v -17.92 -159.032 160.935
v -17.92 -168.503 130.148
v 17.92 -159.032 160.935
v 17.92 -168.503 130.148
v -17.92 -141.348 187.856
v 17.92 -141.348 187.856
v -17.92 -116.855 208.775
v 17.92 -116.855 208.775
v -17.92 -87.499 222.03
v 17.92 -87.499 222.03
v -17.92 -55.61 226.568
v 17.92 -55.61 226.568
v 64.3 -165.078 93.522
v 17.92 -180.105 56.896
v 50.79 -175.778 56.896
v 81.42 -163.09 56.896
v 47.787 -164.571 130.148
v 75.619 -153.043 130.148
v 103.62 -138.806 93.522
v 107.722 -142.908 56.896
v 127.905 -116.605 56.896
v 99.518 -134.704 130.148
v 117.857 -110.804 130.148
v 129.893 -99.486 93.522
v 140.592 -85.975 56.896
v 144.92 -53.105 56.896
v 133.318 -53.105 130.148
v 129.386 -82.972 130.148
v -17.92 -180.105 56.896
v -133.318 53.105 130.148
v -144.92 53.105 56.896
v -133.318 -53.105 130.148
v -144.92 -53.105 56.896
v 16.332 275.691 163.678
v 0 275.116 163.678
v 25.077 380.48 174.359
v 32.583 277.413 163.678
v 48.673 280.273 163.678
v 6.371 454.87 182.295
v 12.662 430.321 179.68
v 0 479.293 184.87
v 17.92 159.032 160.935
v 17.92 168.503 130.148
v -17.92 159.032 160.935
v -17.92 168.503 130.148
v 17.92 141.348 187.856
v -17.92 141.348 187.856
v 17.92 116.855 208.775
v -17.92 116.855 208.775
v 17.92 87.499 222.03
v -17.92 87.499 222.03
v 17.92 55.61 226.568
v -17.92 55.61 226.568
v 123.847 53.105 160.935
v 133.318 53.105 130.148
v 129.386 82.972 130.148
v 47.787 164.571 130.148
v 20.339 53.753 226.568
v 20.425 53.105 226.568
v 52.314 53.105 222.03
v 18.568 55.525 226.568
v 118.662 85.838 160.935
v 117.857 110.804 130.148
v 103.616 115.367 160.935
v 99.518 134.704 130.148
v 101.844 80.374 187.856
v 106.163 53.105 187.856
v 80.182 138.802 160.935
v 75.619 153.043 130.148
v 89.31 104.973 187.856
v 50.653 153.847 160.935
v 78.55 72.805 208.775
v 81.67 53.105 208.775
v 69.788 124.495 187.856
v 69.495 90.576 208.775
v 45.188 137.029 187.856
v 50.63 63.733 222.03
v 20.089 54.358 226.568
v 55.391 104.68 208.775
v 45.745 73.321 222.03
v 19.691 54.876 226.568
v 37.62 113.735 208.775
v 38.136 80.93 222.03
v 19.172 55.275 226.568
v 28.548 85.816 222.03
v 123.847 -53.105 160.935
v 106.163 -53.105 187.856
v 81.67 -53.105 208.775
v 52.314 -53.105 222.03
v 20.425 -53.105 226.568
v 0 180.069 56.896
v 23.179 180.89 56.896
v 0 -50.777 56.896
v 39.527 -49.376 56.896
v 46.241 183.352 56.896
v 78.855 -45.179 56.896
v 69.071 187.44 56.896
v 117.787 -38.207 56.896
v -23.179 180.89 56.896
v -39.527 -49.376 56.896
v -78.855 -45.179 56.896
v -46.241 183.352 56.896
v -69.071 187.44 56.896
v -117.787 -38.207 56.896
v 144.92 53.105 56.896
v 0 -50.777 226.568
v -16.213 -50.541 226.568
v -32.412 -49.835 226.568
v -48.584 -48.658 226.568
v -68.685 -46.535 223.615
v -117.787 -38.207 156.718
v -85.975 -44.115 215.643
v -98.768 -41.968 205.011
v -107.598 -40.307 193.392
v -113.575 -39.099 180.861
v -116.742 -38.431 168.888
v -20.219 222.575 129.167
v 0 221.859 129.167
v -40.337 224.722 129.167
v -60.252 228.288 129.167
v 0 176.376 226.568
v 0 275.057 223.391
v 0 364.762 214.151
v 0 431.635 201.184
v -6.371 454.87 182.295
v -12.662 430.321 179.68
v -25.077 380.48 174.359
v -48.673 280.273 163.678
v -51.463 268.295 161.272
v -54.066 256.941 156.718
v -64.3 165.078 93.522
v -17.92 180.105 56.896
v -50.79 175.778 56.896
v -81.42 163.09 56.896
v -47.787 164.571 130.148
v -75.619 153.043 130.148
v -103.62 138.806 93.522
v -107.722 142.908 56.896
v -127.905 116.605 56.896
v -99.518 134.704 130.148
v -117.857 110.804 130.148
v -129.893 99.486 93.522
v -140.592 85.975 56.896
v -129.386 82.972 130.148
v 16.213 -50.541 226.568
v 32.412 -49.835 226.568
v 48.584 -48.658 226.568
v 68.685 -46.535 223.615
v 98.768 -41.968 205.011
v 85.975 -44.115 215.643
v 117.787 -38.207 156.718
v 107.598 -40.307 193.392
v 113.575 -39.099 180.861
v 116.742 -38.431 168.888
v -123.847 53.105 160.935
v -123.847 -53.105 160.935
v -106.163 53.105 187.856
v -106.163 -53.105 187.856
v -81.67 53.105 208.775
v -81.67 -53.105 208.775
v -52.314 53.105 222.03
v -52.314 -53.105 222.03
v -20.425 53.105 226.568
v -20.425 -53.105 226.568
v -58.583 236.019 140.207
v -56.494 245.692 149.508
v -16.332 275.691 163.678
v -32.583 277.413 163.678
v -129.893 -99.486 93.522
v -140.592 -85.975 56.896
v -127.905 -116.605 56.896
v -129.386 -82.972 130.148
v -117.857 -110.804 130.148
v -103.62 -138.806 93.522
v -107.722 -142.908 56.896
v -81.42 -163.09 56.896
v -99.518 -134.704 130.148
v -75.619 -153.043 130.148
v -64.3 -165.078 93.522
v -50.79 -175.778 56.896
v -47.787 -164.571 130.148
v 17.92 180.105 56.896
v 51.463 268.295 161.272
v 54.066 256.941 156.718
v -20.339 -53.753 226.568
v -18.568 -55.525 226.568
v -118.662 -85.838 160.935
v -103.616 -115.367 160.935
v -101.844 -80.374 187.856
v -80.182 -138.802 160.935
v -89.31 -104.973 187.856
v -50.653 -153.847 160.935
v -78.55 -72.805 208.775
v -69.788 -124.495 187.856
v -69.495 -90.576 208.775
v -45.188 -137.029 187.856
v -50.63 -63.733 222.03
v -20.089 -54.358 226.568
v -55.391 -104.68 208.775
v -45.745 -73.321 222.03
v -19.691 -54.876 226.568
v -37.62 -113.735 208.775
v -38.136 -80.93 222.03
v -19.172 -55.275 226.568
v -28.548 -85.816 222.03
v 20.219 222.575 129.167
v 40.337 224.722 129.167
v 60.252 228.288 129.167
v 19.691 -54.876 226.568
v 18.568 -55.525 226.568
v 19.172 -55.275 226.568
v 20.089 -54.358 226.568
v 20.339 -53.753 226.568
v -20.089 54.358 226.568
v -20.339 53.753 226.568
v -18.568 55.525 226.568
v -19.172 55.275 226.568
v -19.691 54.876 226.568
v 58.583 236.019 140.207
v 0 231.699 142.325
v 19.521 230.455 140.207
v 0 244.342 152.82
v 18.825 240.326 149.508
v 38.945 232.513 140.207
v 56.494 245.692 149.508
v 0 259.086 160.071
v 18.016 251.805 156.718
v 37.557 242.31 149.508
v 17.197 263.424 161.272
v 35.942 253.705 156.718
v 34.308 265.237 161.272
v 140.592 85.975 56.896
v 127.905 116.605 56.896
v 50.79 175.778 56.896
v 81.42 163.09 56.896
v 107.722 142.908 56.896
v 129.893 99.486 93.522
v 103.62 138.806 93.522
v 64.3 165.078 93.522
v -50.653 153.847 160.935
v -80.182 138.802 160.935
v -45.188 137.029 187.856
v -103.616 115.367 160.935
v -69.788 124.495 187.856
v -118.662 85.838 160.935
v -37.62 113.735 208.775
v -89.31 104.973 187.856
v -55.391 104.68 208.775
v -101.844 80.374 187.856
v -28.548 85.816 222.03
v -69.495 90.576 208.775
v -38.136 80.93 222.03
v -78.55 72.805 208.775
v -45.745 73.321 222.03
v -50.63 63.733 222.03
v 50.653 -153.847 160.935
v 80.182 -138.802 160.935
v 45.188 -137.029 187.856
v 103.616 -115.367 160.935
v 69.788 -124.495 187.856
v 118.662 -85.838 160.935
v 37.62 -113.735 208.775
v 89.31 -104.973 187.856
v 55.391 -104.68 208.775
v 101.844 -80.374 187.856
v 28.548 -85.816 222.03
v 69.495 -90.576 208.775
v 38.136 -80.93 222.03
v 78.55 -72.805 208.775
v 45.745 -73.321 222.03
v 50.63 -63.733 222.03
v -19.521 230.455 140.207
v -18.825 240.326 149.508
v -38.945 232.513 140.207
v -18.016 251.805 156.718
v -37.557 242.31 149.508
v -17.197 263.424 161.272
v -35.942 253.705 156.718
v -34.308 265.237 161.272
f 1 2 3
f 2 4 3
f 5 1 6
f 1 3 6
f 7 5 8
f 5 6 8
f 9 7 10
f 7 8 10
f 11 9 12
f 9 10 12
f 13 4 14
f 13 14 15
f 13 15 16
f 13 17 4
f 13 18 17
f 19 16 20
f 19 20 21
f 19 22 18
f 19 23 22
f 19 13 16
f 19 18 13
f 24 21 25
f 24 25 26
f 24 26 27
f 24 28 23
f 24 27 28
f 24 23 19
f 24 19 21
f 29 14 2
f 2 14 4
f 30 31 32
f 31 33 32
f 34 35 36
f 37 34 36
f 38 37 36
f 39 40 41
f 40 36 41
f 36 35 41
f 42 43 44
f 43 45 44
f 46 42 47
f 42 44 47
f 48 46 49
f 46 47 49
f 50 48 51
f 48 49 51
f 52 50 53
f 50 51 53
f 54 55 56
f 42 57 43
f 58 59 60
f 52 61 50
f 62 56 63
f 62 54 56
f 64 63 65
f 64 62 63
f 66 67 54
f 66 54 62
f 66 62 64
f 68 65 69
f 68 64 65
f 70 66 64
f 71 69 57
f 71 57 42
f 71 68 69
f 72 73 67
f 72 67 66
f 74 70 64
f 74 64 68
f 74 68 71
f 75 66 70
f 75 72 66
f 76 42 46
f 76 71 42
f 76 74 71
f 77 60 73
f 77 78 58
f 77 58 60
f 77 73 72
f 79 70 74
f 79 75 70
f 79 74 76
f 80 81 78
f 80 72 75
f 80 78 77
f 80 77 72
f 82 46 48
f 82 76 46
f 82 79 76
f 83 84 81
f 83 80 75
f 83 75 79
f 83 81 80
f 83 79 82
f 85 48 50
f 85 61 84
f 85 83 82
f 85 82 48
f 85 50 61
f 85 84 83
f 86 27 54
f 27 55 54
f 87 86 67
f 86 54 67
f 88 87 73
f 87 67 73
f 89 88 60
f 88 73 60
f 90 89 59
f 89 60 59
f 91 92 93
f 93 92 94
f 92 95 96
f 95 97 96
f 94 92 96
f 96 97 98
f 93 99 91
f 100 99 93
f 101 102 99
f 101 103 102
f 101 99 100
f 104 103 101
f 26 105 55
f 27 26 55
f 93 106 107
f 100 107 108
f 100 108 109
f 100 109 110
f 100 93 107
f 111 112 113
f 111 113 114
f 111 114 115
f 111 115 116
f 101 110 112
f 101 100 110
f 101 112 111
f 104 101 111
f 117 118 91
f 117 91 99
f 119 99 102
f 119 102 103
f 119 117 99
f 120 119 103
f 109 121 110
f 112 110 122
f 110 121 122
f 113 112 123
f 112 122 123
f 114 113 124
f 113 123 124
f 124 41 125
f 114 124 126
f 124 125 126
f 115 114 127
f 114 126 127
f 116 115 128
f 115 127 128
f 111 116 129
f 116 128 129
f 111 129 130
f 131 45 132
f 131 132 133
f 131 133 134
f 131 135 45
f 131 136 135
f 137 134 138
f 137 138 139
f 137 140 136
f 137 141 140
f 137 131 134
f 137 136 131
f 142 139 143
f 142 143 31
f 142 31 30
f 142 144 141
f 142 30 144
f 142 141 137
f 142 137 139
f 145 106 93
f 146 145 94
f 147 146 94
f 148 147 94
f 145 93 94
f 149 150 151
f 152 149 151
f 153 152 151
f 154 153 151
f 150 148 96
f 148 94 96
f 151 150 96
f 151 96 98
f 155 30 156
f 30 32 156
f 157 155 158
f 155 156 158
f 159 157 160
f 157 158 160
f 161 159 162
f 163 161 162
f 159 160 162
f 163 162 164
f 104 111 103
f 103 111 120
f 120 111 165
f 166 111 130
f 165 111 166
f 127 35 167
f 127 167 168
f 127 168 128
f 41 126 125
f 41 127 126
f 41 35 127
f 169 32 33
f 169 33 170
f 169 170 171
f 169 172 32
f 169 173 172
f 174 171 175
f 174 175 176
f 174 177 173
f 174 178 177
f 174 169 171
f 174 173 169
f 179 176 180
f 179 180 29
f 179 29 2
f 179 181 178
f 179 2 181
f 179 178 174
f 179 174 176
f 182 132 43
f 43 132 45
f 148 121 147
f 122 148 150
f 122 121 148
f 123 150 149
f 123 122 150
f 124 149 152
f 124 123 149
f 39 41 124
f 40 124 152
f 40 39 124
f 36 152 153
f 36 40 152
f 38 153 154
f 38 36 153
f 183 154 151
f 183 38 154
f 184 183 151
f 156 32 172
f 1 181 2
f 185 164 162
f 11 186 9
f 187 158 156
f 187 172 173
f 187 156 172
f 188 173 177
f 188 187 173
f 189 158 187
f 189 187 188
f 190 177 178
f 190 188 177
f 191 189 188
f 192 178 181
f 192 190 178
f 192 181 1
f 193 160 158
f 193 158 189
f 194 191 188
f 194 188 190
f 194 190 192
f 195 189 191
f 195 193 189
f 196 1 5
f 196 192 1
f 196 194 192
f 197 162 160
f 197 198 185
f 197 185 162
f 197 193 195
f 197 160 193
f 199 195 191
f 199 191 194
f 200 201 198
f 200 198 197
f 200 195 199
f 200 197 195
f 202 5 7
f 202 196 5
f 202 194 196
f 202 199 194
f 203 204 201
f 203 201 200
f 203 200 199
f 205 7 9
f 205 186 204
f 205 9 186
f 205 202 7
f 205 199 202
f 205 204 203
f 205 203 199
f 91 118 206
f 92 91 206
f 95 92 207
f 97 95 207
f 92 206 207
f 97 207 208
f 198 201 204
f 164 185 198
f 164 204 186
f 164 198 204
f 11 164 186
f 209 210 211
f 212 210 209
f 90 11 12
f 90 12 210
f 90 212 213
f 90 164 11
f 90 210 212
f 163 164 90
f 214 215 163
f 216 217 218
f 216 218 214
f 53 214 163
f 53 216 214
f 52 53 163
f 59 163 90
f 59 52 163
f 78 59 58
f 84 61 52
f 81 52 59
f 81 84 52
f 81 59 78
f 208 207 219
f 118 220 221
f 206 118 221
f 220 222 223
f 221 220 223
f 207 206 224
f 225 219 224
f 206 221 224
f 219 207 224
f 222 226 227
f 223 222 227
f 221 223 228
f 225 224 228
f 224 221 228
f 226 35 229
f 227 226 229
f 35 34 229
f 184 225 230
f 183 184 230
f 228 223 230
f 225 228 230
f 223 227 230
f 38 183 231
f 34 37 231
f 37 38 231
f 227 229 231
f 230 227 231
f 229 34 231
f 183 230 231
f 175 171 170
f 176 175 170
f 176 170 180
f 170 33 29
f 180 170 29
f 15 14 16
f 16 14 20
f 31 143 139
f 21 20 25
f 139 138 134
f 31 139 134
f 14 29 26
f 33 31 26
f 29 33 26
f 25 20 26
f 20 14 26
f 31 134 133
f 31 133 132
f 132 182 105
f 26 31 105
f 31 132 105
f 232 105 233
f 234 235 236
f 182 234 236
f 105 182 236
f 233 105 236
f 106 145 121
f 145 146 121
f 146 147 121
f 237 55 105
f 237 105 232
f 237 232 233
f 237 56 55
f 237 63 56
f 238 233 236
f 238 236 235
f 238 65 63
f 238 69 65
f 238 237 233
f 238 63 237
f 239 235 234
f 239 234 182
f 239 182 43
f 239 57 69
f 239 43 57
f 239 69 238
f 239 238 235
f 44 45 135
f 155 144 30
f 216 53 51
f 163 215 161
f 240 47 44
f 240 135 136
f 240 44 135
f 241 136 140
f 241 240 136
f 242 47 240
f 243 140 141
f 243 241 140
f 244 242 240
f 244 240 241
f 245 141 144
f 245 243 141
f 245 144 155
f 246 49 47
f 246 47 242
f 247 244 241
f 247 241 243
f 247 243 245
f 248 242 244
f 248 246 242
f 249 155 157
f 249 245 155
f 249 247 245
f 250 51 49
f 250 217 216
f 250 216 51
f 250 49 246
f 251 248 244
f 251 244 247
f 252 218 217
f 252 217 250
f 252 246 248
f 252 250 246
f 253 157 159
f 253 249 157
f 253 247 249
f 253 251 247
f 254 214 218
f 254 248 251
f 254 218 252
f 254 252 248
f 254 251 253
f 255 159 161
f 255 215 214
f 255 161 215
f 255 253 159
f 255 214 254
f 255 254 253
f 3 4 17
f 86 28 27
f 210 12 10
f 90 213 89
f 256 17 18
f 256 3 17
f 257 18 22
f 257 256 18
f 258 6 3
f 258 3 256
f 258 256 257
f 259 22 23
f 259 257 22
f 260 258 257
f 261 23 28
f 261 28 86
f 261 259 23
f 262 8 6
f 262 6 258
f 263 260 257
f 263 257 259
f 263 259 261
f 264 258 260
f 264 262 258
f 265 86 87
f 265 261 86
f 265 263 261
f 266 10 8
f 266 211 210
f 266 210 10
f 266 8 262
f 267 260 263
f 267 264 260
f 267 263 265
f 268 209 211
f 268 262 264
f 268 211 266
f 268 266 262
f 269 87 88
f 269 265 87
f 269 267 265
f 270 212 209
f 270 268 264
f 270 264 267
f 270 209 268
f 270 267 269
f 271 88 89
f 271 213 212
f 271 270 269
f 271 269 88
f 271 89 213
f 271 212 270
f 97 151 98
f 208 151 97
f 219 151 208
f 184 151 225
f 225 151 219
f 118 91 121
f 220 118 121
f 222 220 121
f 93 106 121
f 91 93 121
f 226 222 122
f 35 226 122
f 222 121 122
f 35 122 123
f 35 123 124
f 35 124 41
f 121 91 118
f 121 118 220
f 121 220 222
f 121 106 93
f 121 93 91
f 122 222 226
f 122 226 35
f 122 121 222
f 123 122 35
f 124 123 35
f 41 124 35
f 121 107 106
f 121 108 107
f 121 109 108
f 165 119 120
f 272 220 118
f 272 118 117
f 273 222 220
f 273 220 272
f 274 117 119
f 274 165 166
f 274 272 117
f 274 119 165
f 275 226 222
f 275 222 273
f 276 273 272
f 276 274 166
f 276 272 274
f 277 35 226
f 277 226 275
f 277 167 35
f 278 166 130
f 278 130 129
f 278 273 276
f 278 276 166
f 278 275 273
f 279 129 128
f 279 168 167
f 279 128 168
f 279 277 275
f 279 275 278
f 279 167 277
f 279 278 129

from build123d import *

# Parameters (mm, degrees)
F2_DEPTH    = 169.672
F2_TAPER    = 9
F3_R        = 114.3
F6_ANGLE    = 12.1829310863
F7_T2_ANGLE = 12.1829310863
F7_T6_DEPTH = 901.8811791581
F7_S7_R     = 558.1432208419
F7_T8_DEPTH = 470


# Not quite as in the source:
# - a fillet or chamfer that OpenCascade refuses, or shapes differently, is made with other operations: its cross-section is extruded or revolved along the edge and cut away or added


with BuildPart() as f2:
    # F1 (on offset) → F2 (new body)
    with BuildSketch(Plane.XY.offset(56.896)):
        with BuildLine():
            ThreePointArc((-144.9196487665, -53.105003047), (-107.7222099772, -142.9075642577), (-17.9196487665, -180.105003047))
            Line((-17.9196487665, -180.105003047), (0, -180.105003047))
            Line((0, -180.105003047), (17.9196487665, -180.105003047))
            ThreePointArc((17.9196487665, -180.105003047), (107.7222099772, -142.9075642577), (144.9196487665, -53.105003047))
            Line((144.9196487665, -53.105003047), (144.9196487665, 0))
            Line((144.9196487665, 0), (144.9196487665, 53.105003047))
            ThreePointArc((144.9196487665, 53.105003047), (107.7222099772, 142.9075642577), (17.9196487665, 180.105003047))
            Line((17.9196487665, 180.105003047), (0, 180.105003047))
            Line((0, 180.105003047), (-17.9196487665, 180.105003047))
            ThreePointArc((-17.9196487665, 180.105003047), (-107.7222099772, 142.9075642577), (-144.9196487665, 53.105003047))
            Line((-144.9196487665, 53.105003047), (-144.9196487665, 0))
            Line((-144.9196487665, 0), (-144.9196487665, -53.105003047))
        make_face()
    extrude(amount=F2_DEPTH, taper=F2_TAPER)

    # F3
    f3_edges = [f2.edges().sort_by_distance(p)[0] for p in [
        (-118.046244, 0, 226.568),
    ]]
    fillet(f3_edges, radius=F3_R)


with BuildPart() as f6:
    # F4 (on Right) → F6 (revolve)
    with BuildSketch(Plane.YZ):
        Polygon((-50.7769212127, 226.568), (-50.7769212127, 141.7786058209), (-50.7769212127, 56.896), (180.0686866045, 56.896), (239.6881223982, 160.0008904934), (505.895614624, 187.6315176487), (501.8542579455, 226.568), align=None)
    revolve(axis=Axis((0, 507.3662996292, 211.7486968637), (0, 0, -1)), revolution_arc=F6_ANGLE)

    # F7: fillet of radius 69.85 on 2 edges, made by hand

    # F7_s1 → F7_t2 (revolve)
    with BuildSketch(Plane.YZ):
        with BuildLine():
            ThreePointArc((221.8585221218, 129.1666673988), (244.3415795247, 152.8197661139), (275.1158289732, 163.6780587923))
            Line((275.1158289732, 163.6780587923), (274.9716041433, 165.0675940378))
            Line((274.9716041433, 165.0675940378), (238.8353434367, 161.3168823729))
            Line((238.8353434367, 161.3168823729), (220.6491511548, 129.8659748164))
            Line((220.6491511548, 129.8659748164), (221.8585221218, 129.1666673988))
        make_face()
    revolve(axis=Axis((0, 507.3662996292, 160.0008904934), (0, 0, -1)), revolution_arc=F7_T2_ANGLE)


with BuildPart() as f7_tool4:
    # F7_s5 → F7_t6 (new body)
    with BuildSketch(Plane(origin=(140.3484830453, 650.074981269, 0), x_dir=(0, 0, 1), z_dir=(-0.2110336063, -0.9774788064, 0))):
        with BuildLine():
            ThreePointArc((226.568, 37.2213399469), (206.1094086659, 86.6127486127), (156.718, 107.0713399469))
            Line((156.718, 107.0713399469), (156.718, 108.4683399469))
            Line((156.718, 108.4683399469), (227.965, 108.4683399469))
            Line((227.965, 108.4683399469), (227.965, 37.2213399469))
            Line((227.965, 37.2213399469), (226.568, 37.2213399469))
        make_face()
    extrude(amount=F7_T6_DEPTH)

    # F7_s7 → F7_t8 (intersect, symmetric)
    with BuildSketch(Plane.XY.offset(192.3)):
        with Locations((0, 507.3662996292)):
            Circle(F7_S7_R)
    extrude(amount=F7_T8_DEPTH, both=True, mode=Mode.INTERSECT)


with BuildPart() as f6_1:
    add(f6.part)

    # F7_t3: cut F7_tool4
    add(f7_tool4.part, mode=Mode.SUBTRACT)


with BuildPart() as f8_1:
    # F8: instance of F6
    add(f6_1.part.mirror(Plane.YZ))


solid = Compound([f2.part, f6_1.part, f8_1.part])
